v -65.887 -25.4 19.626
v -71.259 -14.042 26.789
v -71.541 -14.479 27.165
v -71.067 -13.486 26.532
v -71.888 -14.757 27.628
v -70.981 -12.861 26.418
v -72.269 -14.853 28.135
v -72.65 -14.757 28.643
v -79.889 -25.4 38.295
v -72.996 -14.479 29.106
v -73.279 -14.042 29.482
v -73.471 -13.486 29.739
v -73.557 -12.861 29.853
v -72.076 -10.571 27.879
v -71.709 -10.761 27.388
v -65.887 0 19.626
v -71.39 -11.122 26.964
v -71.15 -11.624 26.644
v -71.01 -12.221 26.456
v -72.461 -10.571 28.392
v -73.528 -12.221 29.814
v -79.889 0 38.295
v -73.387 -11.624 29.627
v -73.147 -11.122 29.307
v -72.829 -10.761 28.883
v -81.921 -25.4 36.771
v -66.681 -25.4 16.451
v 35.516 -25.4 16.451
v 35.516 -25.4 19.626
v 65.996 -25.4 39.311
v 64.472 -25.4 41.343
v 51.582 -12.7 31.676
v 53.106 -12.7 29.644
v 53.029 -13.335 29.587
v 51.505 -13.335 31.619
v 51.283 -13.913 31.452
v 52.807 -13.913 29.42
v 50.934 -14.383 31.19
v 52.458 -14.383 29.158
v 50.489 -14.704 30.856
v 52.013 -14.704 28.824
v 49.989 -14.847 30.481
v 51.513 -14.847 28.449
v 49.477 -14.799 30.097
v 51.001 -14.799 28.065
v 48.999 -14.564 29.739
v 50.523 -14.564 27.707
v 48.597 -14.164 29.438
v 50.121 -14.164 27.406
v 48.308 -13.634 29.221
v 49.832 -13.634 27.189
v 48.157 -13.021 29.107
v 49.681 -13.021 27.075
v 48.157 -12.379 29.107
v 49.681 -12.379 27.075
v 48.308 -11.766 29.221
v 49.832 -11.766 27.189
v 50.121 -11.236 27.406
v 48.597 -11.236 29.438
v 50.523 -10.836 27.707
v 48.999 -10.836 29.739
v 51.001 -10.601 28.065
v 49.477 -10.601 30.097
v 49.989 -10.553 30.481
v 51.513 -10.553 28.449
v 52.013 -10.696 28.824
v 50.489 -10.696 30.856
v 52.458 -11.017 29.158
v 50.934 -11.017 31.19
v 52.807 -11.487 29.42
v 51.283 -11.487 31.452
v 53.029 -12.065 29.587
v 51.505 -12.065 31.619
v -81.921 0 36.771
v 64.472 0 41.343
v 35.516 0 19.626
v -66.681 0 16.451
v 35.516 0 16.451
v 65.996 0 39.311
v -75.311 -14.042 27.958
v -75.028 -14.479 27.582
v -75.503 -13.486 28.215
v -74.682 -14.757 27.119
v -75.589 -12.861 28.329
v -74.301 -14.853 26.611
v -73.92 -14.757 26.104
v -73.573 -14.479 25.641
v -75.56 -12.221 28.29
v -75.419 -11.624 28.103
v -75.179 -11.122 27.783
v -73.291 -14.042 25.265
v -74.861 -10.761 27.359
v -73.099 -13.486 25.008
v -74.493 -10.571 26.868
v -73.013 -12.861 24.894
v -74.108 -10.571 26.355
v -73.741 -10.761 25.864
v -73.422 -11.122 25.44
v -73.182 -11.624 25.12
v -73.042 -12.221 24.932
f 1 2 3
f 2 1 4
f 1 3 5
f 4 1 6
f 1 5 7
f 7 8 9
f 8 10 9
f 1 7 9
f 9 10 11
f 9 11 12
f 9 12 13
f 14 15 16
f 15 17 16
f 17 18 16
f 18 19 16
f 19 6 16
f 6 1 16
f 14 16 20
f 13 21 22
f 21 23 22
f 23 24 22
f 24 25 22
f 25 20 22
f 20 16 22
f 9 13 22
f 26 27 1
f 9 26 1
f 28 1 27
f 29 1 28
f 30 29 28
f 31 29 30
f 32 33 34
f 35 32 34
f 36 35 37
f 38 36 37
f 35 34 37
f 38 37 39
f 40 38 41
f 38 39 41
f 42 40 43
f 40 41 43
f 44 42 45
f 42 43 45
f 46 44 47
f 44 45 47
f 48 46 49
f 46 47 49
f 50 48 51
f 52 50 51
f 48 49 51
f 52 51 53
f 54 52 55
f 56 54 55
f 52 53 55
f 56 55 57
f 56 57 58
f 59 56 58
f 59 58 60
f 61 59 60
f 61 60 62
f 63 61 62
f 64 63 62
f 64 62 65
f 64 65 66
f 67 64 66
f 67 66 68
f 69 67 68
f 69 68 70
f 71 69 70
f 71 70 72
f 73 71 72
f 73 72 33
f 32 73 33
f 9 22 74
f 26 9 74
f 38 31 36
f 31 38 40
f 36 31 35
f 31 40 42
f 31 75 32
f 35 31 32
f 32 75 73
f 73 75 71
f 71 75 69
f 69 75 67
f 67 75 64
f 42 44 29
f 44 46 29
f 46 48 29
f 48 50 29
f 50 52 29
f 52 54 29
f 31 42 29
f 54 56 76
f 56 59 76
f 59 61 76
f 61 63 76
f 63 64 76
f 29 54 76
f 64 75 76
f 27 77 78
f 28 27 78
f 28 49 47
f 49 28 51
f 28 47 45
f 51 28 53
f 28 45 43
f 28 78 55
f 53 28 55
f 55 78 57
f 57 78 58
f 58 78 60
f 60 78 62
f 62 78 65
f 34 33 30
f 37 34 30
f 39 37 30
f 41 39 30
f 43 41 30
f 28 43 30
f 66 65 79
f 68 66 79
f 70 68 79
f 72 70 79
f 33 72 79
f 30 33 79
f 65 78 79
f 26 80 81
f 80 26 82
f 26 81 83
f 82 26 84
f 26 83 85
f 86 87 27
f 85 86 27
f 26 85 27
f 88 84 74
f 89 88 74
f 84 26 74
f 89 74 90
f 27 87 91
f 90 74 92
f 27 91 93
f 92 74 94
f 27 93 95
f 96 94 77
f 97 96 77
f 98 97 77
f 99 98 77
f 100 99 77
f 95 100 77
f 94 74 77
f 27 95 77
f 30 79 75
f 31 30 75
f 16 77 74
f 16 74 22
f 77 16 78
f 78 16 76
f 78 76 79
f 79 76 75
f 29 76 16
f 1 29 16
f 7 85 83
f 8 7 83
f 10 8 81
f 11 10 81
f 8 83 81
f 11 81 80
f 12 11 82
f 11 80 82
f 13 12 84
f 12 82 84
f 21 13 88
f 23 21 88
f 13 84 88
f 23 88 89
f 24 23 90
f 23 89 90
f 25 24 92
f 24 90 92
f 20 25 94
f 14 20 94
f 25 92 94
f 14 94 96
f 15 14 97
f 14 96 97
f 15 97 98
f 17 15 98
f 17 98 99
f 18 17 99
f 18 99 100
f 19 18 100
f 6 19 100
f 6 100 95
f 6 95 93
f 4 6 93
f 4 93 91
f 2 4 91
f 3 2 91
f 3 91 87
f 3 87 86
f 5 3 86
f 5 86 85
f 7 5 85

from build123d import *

# Parameters (mm, degrees)
F1_DEPTH = 25.4
F2_R     = 2.15265
F4_DEPTH = 25.4
F3_R     = 2.15265
F5_DEPTH = 25.4


with BuildPart() as f1:
    # F0 (on Front) → F1 (new body)
    with BuildSketch(Plane.XZ):
        Polygon((-66.6809173423, 16.451433301), (35.5159826577, 16.451433301), (65.9959826577, 39.311433301), (64.4719826577, 41.343433301), (35.5159826577, 19.626433301), (-65.8871673423, 19.626433301), (-79.8889173423, 38.295433301), (-81.9209173423, 36.771433301), align=None)
    extrude(amount=F1_DEPTH)

    # F2 (on face) → F4 (cut)
    with BuildSketch(Plane(origin=(4.8890657723, 0, -6.5187543631), x_dir=(0.8, 0, 0.6), z_dir=(0.6, 0, -0.8))):
        with Locations((58.1185061067, 12.7)):
            Circle(F2_R)
    extrude(amount=-F4_DEPTH, mode=Mode.SUBTRACT)

    # F3 (on face) → F5 (cut)
    with BuildSketch(Plane(origin=(-34.7790991146, 0, -26.084324336), x_dir=(0, -1, 0), z_dir=(-0.8, 0, -0.6))):
        with Locations((12.7, 65.8696970462)):
            Circle(F3_R)
    extrude(amount=-F5_DEPTH, mode=Mode.SUBTRACT)


solid = f1.part
